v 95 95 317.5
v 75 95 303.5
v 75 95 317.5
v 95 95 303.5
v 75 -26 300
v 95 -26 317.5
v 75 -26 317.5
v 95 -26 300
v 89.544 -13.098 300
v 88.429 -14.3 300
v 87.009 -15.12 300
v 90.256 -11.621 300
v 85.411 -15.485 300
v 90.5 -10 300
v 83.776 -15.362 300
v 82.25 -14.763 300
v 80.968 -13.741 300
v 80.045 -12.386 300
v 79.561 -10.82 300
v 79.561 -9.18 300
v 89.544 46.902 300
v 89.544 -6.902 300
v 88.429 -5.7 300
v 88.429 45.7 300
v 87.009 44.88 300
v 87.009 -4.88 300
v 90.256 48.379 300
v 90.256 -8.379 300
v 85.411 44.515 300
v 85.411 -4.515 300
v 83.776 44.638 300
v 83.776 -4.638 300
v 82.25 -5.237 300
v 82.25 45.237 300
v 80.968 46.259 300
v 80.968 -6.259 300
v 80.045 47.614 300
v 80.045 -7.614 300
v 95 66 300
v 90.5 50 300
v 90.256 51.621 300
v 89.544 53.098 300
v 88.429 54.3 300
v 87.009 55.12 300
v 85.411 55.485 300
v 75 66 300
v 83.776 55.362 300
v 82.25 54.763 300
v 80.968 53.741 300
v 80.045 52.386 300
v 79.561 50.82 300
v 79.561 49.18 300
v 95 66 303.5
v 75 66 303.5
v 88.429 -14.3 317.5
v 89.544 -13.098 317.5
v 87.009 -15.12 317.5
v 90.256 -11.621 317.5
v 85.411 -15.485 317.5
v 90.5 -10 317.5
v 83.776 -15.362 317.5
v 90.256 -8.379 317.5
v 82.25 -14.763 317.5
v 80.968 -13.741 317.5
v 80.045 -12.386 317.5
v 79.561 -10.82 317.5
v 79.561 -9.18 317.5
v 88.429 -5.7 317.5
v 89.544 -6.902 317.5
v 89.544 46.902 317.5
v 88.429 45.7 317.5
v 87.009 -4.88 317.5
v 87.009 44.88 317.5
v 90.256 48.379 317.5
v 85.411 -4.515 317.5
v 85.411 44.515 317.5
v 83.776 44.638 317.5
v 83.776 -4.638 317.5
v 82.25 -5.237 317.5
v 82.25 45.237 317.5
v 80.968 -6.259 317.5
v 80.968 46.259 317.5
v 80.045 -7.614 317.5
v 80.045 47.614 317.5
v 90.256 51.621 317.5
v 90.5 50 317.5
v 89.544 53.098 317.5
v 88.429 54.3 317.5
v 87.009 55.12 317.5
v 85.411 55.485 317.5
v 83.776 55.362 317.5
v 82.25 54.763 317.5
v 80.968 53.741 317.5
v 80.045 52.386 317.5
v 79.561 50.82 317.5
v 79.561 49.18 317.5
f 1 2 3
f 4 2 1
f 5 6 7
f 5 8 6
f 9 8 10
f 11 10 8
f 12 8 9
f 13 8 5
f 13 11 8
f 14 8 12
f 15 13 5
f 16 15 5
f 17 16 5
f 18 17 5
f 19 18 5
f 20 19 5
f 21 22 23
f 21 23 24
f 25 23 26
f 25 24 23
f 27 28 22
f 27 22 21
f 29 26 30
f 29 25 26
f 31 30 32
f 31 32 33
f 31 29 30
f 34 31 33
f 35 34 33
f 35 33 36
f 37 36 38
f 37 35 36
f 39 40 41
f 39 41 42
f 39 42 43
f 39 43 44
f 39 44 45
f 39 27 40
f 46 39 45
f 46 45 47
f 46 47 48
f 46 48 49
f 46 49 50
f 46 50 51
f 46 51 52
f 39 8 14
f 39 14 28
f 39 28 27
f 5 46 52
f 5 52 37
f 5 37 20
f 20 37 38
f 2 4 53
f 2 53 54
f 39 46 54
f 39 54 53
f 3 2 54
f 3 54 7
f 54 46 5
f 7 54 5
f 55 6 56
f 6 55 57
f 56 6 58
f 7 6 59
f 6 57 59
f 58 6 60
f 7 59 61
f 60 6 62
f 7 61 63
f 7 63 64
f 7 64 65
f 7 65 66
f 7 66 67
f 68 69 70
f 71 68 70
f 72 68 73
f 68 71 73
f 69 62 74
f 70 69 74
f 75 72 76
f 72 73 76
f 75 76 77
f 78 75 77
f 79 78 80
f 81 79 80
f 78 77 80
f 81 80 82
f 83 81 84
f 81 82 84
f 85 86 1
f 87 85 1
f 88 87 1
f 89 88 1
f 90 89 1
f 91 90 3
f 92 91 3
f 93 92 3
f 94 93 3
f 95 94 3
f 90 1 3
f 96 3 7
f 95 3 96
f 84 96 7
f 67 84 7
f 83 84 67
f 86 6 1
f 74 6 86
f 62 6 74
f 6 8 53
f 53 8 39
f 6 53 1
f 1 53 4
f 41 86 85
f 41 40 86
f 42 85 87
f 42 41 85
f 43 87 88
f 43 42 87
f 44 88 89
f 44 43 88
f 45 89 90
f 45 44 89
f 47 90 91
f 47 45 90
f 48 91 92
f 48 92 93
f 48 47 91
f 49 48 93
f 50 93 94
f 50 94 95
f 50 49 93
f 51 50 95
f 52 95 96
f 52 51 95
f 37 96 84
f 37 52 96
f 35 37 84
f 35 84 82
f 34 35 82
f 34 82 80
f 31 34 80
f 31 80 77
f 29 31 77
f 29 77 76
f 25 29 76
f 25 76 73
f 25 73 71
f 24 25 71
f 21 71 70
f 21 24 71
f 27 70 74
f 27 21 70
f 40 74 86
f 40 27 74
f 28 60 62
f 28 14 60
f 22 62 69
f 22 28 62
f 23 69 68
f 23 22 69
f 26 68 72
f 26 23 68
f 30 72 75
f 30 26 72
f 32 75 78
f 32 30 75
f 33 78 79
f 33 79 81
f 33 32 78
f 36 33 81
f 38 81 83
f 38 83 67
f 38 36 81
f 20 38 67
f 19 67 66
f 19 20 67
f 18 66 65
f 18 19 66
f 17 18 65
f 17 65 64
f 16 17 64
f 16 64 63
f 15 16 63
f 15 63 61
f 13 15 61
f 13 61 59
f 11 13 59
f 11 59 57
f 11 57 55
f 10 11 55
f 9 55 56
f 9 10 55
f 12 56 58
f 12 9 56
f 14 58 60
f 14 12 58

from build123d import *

# Parameters (mm, degrees)
SKETCH1_R           = 5.5
BOSS_EXTRUDE1_DEPTH = 3.5
SKETCH2_R           = 5.5
BOSS_EXTRUDE2_DEPTH = 14


with BuildPart() as part:
    # Sketch1 → Boss-Extrude1 (new body)
    with BuildSketch(Plane.XY.offset(300)):
        Polygon((75, 66), (95, 66), (95, -26), (85, -26), (75, -26), (75, 10), (75, 50), (75, 60), align=None)
        with Locations((85, -10)):
            Circle(SKETCH1_R, mode=Mode.SUBTRACT)
        with Locations((85, 50)):
            Circle(SKETCH1_R, mode=Mode.SUBTRACT)
    extrude(amount=BOSS_EXTRUDE1_DEPTH)

    # Sketch2 → Boss-Extrude2 (add)
    with BuildSketch(Plane.XY.offset(303.5)):
        Polygon((75, 10), (75, 85), (75, 95), (95, 95), (95, 66), (95, -26), (75, -26), align=None)
        with Locations((85, 50)):
            Circle(SKETCH2_R, mode=Mode.SUBTRACT)
        with Locations((85, -10)):
            Circle(SKETCH2_R, mode=Mode.SUBTRACT)
    extrude(amount=BOSS_EXTRUDE2_DEPTH)


solid = part.part
